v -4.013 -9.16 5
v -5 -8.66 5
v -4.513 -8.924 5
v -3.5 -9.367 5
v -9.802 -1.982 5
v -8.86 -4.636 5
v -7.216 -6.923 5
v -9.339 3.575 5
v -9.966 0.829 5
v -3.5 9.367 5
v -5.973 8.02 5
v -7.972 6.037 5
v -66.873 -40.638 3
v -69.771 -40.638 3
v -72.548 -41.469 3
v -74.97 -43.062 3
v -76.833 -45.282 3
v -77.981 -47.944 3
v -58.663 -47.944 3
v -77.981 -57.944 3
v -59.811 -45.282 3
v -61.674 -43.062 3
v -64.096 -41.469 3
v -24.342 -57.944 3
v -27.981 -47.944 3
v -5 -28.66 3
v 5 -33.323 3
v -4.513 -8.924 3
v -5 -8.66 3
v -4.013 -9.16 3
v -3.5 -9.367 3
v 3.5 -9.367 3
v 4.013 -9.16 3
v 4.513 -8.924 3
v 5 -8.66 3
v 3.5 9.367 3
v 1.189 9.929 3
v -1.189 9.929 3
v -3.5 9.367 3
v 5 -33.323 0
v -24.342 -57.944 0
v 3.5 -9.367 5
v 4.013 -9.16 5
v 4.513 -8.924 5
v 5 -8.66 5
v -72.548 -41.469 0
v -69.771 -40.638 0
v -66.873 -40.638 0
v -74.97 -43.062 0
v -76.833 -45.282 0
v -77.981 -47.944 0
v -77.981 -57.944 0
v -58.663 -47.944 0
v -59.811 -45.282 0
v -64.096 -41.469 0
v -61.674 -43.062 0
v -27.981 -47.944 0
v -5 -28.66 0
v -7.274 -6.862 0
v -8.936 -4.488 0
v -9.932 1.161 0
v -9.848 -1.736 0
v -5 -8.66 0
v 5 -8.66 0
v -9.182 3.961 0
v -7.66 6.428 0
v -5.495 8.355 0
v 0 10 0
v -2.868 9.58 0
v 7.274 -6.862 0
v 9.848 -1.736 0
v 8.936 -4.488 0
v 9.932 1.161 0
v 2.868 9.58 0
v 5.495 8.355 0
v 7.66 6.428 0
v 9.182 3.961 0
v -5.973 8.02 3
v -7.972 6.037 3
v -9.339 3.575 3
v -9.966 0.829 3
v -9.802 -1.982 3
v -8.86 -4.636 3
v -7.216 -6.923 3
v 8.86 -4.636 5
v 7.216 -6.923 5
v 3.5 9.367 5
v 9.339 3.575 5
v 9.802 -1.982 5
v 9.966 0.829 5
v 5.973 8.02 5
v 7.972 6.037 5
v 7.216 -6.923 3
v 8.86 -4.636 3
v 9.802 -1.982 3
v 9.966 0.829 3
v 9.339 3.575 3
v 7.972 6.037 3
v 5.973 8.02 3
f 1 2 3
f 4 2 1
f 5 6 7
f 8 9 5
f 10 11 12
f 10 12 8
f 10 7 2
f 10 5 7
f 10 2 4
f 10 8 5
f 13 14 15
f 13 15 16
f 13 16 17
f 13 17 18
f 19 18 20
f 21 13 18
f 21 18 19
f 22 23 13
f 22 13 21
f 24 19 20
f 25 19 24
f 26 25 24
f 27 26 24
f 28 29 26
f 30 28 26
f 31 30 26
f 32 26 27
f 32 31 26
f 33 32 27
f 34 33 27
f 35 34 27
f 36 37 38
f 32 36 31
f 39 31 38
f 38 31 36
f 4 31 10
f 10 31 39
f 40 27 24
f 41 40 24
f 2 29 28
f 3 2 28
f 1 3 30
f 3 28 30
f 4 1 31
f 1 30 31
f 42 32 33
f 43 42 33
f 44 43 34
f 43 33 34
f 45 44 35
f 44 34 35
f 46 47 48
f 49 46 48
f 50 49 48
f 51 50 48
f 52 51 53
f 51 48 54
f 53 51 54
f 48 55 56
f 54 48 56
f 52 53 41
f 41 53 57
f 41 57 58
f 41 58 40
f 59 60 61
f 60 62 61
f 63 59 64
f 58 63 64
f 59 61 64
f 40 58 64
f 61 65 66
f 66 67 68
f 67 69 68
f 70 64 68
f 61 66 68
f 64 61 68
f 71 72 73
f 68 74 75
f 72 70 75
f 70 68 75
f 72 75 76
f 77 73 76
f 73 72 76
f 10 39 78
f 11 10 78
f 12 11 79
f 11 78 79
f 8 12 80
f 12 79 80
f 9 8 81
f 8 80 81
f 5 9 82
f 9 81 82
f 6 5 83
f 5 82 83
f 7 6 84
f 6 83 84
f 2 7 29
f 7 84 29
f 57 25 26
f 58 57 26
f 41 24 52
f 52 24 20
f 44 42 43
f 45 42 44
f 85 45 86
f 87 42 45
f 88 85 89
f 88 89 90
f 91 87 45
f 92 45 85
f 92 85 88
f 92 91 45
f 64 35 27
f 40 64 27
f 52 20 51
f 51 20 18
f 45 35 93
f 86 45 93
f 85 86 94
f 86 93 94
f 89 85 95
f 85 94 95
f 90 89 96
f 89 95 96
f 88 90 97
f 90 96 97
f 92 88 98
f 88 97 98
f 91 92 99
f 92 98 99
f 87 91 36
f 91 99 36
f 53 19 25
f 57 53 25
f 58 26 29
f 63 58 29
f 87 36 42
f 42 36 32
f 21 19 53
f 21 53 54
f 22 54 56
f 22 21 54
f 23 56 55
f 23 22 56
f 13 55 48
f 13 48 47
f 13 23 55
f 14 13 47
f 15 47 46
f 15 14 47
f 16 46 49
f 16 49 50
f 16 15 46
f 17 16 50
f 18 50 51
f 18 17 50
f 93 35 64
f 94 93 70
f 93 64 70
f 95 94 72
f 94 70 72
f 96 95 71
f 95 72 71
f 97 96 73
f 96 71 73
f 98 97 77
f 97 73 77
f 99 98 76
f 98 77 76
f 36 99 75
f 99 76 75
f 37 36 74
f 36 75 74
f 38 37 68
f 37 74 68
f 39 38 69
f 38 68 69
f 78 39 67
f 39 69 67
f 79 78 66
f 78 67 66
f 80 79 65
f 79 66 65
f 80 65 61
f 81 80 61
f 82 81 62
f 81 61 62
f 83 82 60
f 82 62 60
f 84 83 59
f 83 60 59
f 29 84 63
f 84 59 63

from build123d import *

# Parameters (mm, degrees)
SKETCH2_R           = 10
BOSS_EXTRUDE1_DEPTH = 3
BOSS_EXTRUDE2_DEPTH = 3
BOSS_EXTRUDE3_DEPTH = 3
BOSS_EXTRUDE7_DEPTH = 2


with BuildPart() as part:
    # Sketch2 → Boss-Extrude1 (new body)
    with BuildSketch(Plane.XY):
        Circle(SKETCH2_R)
    extrude(amount=BOSS_EXTRUDE1_DEPTH)

    # Sketch3 → Boss-Extrude2 (add)
    with BuildSketch(Plane.XY.offset(3)):
        Polygon((-5, -8.660254038), (5, -8.660254038), (5, -33.323330619), (-24.341630951, -57.943882328), (-77.981333294, -57.943882328), (-77.981333294, -47.943882328), (-27.981333294, -47.943882328), (-5, -28.660254038), align=None)
    extrude(amount=-BOSS_EXTRUDE2_DEPTH)

    # Sketch4 → Boss-Extrude3 (add)
    with BuildSketch(Plane.XY.offset(3)):
        with BuildLine():
            Line((-77.981333294, -47.943882328), (-58.662816768, -47.943882328))
            ThreePointArc((-58.662816768, -47.943882328), (-68.322075031, -40.532072779), (-77.981333294, -47.943882328))
        make_face()
    extrude(amount=-BOSS_EXTRUDE3_DEPTH)

    # Sketch5 → Boss-Extrude7 (add)
    with BuildSketch(Plane.XY.offset(3)):
        with BuildLine():
            Line((-3.5, -9.367496998), (-3.5, 9.367496998))
            ThreePointArc((-3.5, 9.367496998), (-9.965563298, 0.829185233), (-5, -8.660254038))
            ThreePointArc((-5, -8.660254038), (-4.264686173, -9.045023596), (-3.5, -9.367496998))
        make_face()
        with BuildLine():
            ThreePointArc((5, -8.660254038), (9.965563298, 0.829185233), (3.5, 9.367496998))
            Line((3.5, 9.367496998), (3.5, -9.367496998))
            ThreePointArc((3.5, -9.367496998), (4.264686173, -9.045023596), (5, -8.660254038))
        make_face()
    extrude(amount=BOSS_EXTRUDE7_DEPTH)


solid = part.part
